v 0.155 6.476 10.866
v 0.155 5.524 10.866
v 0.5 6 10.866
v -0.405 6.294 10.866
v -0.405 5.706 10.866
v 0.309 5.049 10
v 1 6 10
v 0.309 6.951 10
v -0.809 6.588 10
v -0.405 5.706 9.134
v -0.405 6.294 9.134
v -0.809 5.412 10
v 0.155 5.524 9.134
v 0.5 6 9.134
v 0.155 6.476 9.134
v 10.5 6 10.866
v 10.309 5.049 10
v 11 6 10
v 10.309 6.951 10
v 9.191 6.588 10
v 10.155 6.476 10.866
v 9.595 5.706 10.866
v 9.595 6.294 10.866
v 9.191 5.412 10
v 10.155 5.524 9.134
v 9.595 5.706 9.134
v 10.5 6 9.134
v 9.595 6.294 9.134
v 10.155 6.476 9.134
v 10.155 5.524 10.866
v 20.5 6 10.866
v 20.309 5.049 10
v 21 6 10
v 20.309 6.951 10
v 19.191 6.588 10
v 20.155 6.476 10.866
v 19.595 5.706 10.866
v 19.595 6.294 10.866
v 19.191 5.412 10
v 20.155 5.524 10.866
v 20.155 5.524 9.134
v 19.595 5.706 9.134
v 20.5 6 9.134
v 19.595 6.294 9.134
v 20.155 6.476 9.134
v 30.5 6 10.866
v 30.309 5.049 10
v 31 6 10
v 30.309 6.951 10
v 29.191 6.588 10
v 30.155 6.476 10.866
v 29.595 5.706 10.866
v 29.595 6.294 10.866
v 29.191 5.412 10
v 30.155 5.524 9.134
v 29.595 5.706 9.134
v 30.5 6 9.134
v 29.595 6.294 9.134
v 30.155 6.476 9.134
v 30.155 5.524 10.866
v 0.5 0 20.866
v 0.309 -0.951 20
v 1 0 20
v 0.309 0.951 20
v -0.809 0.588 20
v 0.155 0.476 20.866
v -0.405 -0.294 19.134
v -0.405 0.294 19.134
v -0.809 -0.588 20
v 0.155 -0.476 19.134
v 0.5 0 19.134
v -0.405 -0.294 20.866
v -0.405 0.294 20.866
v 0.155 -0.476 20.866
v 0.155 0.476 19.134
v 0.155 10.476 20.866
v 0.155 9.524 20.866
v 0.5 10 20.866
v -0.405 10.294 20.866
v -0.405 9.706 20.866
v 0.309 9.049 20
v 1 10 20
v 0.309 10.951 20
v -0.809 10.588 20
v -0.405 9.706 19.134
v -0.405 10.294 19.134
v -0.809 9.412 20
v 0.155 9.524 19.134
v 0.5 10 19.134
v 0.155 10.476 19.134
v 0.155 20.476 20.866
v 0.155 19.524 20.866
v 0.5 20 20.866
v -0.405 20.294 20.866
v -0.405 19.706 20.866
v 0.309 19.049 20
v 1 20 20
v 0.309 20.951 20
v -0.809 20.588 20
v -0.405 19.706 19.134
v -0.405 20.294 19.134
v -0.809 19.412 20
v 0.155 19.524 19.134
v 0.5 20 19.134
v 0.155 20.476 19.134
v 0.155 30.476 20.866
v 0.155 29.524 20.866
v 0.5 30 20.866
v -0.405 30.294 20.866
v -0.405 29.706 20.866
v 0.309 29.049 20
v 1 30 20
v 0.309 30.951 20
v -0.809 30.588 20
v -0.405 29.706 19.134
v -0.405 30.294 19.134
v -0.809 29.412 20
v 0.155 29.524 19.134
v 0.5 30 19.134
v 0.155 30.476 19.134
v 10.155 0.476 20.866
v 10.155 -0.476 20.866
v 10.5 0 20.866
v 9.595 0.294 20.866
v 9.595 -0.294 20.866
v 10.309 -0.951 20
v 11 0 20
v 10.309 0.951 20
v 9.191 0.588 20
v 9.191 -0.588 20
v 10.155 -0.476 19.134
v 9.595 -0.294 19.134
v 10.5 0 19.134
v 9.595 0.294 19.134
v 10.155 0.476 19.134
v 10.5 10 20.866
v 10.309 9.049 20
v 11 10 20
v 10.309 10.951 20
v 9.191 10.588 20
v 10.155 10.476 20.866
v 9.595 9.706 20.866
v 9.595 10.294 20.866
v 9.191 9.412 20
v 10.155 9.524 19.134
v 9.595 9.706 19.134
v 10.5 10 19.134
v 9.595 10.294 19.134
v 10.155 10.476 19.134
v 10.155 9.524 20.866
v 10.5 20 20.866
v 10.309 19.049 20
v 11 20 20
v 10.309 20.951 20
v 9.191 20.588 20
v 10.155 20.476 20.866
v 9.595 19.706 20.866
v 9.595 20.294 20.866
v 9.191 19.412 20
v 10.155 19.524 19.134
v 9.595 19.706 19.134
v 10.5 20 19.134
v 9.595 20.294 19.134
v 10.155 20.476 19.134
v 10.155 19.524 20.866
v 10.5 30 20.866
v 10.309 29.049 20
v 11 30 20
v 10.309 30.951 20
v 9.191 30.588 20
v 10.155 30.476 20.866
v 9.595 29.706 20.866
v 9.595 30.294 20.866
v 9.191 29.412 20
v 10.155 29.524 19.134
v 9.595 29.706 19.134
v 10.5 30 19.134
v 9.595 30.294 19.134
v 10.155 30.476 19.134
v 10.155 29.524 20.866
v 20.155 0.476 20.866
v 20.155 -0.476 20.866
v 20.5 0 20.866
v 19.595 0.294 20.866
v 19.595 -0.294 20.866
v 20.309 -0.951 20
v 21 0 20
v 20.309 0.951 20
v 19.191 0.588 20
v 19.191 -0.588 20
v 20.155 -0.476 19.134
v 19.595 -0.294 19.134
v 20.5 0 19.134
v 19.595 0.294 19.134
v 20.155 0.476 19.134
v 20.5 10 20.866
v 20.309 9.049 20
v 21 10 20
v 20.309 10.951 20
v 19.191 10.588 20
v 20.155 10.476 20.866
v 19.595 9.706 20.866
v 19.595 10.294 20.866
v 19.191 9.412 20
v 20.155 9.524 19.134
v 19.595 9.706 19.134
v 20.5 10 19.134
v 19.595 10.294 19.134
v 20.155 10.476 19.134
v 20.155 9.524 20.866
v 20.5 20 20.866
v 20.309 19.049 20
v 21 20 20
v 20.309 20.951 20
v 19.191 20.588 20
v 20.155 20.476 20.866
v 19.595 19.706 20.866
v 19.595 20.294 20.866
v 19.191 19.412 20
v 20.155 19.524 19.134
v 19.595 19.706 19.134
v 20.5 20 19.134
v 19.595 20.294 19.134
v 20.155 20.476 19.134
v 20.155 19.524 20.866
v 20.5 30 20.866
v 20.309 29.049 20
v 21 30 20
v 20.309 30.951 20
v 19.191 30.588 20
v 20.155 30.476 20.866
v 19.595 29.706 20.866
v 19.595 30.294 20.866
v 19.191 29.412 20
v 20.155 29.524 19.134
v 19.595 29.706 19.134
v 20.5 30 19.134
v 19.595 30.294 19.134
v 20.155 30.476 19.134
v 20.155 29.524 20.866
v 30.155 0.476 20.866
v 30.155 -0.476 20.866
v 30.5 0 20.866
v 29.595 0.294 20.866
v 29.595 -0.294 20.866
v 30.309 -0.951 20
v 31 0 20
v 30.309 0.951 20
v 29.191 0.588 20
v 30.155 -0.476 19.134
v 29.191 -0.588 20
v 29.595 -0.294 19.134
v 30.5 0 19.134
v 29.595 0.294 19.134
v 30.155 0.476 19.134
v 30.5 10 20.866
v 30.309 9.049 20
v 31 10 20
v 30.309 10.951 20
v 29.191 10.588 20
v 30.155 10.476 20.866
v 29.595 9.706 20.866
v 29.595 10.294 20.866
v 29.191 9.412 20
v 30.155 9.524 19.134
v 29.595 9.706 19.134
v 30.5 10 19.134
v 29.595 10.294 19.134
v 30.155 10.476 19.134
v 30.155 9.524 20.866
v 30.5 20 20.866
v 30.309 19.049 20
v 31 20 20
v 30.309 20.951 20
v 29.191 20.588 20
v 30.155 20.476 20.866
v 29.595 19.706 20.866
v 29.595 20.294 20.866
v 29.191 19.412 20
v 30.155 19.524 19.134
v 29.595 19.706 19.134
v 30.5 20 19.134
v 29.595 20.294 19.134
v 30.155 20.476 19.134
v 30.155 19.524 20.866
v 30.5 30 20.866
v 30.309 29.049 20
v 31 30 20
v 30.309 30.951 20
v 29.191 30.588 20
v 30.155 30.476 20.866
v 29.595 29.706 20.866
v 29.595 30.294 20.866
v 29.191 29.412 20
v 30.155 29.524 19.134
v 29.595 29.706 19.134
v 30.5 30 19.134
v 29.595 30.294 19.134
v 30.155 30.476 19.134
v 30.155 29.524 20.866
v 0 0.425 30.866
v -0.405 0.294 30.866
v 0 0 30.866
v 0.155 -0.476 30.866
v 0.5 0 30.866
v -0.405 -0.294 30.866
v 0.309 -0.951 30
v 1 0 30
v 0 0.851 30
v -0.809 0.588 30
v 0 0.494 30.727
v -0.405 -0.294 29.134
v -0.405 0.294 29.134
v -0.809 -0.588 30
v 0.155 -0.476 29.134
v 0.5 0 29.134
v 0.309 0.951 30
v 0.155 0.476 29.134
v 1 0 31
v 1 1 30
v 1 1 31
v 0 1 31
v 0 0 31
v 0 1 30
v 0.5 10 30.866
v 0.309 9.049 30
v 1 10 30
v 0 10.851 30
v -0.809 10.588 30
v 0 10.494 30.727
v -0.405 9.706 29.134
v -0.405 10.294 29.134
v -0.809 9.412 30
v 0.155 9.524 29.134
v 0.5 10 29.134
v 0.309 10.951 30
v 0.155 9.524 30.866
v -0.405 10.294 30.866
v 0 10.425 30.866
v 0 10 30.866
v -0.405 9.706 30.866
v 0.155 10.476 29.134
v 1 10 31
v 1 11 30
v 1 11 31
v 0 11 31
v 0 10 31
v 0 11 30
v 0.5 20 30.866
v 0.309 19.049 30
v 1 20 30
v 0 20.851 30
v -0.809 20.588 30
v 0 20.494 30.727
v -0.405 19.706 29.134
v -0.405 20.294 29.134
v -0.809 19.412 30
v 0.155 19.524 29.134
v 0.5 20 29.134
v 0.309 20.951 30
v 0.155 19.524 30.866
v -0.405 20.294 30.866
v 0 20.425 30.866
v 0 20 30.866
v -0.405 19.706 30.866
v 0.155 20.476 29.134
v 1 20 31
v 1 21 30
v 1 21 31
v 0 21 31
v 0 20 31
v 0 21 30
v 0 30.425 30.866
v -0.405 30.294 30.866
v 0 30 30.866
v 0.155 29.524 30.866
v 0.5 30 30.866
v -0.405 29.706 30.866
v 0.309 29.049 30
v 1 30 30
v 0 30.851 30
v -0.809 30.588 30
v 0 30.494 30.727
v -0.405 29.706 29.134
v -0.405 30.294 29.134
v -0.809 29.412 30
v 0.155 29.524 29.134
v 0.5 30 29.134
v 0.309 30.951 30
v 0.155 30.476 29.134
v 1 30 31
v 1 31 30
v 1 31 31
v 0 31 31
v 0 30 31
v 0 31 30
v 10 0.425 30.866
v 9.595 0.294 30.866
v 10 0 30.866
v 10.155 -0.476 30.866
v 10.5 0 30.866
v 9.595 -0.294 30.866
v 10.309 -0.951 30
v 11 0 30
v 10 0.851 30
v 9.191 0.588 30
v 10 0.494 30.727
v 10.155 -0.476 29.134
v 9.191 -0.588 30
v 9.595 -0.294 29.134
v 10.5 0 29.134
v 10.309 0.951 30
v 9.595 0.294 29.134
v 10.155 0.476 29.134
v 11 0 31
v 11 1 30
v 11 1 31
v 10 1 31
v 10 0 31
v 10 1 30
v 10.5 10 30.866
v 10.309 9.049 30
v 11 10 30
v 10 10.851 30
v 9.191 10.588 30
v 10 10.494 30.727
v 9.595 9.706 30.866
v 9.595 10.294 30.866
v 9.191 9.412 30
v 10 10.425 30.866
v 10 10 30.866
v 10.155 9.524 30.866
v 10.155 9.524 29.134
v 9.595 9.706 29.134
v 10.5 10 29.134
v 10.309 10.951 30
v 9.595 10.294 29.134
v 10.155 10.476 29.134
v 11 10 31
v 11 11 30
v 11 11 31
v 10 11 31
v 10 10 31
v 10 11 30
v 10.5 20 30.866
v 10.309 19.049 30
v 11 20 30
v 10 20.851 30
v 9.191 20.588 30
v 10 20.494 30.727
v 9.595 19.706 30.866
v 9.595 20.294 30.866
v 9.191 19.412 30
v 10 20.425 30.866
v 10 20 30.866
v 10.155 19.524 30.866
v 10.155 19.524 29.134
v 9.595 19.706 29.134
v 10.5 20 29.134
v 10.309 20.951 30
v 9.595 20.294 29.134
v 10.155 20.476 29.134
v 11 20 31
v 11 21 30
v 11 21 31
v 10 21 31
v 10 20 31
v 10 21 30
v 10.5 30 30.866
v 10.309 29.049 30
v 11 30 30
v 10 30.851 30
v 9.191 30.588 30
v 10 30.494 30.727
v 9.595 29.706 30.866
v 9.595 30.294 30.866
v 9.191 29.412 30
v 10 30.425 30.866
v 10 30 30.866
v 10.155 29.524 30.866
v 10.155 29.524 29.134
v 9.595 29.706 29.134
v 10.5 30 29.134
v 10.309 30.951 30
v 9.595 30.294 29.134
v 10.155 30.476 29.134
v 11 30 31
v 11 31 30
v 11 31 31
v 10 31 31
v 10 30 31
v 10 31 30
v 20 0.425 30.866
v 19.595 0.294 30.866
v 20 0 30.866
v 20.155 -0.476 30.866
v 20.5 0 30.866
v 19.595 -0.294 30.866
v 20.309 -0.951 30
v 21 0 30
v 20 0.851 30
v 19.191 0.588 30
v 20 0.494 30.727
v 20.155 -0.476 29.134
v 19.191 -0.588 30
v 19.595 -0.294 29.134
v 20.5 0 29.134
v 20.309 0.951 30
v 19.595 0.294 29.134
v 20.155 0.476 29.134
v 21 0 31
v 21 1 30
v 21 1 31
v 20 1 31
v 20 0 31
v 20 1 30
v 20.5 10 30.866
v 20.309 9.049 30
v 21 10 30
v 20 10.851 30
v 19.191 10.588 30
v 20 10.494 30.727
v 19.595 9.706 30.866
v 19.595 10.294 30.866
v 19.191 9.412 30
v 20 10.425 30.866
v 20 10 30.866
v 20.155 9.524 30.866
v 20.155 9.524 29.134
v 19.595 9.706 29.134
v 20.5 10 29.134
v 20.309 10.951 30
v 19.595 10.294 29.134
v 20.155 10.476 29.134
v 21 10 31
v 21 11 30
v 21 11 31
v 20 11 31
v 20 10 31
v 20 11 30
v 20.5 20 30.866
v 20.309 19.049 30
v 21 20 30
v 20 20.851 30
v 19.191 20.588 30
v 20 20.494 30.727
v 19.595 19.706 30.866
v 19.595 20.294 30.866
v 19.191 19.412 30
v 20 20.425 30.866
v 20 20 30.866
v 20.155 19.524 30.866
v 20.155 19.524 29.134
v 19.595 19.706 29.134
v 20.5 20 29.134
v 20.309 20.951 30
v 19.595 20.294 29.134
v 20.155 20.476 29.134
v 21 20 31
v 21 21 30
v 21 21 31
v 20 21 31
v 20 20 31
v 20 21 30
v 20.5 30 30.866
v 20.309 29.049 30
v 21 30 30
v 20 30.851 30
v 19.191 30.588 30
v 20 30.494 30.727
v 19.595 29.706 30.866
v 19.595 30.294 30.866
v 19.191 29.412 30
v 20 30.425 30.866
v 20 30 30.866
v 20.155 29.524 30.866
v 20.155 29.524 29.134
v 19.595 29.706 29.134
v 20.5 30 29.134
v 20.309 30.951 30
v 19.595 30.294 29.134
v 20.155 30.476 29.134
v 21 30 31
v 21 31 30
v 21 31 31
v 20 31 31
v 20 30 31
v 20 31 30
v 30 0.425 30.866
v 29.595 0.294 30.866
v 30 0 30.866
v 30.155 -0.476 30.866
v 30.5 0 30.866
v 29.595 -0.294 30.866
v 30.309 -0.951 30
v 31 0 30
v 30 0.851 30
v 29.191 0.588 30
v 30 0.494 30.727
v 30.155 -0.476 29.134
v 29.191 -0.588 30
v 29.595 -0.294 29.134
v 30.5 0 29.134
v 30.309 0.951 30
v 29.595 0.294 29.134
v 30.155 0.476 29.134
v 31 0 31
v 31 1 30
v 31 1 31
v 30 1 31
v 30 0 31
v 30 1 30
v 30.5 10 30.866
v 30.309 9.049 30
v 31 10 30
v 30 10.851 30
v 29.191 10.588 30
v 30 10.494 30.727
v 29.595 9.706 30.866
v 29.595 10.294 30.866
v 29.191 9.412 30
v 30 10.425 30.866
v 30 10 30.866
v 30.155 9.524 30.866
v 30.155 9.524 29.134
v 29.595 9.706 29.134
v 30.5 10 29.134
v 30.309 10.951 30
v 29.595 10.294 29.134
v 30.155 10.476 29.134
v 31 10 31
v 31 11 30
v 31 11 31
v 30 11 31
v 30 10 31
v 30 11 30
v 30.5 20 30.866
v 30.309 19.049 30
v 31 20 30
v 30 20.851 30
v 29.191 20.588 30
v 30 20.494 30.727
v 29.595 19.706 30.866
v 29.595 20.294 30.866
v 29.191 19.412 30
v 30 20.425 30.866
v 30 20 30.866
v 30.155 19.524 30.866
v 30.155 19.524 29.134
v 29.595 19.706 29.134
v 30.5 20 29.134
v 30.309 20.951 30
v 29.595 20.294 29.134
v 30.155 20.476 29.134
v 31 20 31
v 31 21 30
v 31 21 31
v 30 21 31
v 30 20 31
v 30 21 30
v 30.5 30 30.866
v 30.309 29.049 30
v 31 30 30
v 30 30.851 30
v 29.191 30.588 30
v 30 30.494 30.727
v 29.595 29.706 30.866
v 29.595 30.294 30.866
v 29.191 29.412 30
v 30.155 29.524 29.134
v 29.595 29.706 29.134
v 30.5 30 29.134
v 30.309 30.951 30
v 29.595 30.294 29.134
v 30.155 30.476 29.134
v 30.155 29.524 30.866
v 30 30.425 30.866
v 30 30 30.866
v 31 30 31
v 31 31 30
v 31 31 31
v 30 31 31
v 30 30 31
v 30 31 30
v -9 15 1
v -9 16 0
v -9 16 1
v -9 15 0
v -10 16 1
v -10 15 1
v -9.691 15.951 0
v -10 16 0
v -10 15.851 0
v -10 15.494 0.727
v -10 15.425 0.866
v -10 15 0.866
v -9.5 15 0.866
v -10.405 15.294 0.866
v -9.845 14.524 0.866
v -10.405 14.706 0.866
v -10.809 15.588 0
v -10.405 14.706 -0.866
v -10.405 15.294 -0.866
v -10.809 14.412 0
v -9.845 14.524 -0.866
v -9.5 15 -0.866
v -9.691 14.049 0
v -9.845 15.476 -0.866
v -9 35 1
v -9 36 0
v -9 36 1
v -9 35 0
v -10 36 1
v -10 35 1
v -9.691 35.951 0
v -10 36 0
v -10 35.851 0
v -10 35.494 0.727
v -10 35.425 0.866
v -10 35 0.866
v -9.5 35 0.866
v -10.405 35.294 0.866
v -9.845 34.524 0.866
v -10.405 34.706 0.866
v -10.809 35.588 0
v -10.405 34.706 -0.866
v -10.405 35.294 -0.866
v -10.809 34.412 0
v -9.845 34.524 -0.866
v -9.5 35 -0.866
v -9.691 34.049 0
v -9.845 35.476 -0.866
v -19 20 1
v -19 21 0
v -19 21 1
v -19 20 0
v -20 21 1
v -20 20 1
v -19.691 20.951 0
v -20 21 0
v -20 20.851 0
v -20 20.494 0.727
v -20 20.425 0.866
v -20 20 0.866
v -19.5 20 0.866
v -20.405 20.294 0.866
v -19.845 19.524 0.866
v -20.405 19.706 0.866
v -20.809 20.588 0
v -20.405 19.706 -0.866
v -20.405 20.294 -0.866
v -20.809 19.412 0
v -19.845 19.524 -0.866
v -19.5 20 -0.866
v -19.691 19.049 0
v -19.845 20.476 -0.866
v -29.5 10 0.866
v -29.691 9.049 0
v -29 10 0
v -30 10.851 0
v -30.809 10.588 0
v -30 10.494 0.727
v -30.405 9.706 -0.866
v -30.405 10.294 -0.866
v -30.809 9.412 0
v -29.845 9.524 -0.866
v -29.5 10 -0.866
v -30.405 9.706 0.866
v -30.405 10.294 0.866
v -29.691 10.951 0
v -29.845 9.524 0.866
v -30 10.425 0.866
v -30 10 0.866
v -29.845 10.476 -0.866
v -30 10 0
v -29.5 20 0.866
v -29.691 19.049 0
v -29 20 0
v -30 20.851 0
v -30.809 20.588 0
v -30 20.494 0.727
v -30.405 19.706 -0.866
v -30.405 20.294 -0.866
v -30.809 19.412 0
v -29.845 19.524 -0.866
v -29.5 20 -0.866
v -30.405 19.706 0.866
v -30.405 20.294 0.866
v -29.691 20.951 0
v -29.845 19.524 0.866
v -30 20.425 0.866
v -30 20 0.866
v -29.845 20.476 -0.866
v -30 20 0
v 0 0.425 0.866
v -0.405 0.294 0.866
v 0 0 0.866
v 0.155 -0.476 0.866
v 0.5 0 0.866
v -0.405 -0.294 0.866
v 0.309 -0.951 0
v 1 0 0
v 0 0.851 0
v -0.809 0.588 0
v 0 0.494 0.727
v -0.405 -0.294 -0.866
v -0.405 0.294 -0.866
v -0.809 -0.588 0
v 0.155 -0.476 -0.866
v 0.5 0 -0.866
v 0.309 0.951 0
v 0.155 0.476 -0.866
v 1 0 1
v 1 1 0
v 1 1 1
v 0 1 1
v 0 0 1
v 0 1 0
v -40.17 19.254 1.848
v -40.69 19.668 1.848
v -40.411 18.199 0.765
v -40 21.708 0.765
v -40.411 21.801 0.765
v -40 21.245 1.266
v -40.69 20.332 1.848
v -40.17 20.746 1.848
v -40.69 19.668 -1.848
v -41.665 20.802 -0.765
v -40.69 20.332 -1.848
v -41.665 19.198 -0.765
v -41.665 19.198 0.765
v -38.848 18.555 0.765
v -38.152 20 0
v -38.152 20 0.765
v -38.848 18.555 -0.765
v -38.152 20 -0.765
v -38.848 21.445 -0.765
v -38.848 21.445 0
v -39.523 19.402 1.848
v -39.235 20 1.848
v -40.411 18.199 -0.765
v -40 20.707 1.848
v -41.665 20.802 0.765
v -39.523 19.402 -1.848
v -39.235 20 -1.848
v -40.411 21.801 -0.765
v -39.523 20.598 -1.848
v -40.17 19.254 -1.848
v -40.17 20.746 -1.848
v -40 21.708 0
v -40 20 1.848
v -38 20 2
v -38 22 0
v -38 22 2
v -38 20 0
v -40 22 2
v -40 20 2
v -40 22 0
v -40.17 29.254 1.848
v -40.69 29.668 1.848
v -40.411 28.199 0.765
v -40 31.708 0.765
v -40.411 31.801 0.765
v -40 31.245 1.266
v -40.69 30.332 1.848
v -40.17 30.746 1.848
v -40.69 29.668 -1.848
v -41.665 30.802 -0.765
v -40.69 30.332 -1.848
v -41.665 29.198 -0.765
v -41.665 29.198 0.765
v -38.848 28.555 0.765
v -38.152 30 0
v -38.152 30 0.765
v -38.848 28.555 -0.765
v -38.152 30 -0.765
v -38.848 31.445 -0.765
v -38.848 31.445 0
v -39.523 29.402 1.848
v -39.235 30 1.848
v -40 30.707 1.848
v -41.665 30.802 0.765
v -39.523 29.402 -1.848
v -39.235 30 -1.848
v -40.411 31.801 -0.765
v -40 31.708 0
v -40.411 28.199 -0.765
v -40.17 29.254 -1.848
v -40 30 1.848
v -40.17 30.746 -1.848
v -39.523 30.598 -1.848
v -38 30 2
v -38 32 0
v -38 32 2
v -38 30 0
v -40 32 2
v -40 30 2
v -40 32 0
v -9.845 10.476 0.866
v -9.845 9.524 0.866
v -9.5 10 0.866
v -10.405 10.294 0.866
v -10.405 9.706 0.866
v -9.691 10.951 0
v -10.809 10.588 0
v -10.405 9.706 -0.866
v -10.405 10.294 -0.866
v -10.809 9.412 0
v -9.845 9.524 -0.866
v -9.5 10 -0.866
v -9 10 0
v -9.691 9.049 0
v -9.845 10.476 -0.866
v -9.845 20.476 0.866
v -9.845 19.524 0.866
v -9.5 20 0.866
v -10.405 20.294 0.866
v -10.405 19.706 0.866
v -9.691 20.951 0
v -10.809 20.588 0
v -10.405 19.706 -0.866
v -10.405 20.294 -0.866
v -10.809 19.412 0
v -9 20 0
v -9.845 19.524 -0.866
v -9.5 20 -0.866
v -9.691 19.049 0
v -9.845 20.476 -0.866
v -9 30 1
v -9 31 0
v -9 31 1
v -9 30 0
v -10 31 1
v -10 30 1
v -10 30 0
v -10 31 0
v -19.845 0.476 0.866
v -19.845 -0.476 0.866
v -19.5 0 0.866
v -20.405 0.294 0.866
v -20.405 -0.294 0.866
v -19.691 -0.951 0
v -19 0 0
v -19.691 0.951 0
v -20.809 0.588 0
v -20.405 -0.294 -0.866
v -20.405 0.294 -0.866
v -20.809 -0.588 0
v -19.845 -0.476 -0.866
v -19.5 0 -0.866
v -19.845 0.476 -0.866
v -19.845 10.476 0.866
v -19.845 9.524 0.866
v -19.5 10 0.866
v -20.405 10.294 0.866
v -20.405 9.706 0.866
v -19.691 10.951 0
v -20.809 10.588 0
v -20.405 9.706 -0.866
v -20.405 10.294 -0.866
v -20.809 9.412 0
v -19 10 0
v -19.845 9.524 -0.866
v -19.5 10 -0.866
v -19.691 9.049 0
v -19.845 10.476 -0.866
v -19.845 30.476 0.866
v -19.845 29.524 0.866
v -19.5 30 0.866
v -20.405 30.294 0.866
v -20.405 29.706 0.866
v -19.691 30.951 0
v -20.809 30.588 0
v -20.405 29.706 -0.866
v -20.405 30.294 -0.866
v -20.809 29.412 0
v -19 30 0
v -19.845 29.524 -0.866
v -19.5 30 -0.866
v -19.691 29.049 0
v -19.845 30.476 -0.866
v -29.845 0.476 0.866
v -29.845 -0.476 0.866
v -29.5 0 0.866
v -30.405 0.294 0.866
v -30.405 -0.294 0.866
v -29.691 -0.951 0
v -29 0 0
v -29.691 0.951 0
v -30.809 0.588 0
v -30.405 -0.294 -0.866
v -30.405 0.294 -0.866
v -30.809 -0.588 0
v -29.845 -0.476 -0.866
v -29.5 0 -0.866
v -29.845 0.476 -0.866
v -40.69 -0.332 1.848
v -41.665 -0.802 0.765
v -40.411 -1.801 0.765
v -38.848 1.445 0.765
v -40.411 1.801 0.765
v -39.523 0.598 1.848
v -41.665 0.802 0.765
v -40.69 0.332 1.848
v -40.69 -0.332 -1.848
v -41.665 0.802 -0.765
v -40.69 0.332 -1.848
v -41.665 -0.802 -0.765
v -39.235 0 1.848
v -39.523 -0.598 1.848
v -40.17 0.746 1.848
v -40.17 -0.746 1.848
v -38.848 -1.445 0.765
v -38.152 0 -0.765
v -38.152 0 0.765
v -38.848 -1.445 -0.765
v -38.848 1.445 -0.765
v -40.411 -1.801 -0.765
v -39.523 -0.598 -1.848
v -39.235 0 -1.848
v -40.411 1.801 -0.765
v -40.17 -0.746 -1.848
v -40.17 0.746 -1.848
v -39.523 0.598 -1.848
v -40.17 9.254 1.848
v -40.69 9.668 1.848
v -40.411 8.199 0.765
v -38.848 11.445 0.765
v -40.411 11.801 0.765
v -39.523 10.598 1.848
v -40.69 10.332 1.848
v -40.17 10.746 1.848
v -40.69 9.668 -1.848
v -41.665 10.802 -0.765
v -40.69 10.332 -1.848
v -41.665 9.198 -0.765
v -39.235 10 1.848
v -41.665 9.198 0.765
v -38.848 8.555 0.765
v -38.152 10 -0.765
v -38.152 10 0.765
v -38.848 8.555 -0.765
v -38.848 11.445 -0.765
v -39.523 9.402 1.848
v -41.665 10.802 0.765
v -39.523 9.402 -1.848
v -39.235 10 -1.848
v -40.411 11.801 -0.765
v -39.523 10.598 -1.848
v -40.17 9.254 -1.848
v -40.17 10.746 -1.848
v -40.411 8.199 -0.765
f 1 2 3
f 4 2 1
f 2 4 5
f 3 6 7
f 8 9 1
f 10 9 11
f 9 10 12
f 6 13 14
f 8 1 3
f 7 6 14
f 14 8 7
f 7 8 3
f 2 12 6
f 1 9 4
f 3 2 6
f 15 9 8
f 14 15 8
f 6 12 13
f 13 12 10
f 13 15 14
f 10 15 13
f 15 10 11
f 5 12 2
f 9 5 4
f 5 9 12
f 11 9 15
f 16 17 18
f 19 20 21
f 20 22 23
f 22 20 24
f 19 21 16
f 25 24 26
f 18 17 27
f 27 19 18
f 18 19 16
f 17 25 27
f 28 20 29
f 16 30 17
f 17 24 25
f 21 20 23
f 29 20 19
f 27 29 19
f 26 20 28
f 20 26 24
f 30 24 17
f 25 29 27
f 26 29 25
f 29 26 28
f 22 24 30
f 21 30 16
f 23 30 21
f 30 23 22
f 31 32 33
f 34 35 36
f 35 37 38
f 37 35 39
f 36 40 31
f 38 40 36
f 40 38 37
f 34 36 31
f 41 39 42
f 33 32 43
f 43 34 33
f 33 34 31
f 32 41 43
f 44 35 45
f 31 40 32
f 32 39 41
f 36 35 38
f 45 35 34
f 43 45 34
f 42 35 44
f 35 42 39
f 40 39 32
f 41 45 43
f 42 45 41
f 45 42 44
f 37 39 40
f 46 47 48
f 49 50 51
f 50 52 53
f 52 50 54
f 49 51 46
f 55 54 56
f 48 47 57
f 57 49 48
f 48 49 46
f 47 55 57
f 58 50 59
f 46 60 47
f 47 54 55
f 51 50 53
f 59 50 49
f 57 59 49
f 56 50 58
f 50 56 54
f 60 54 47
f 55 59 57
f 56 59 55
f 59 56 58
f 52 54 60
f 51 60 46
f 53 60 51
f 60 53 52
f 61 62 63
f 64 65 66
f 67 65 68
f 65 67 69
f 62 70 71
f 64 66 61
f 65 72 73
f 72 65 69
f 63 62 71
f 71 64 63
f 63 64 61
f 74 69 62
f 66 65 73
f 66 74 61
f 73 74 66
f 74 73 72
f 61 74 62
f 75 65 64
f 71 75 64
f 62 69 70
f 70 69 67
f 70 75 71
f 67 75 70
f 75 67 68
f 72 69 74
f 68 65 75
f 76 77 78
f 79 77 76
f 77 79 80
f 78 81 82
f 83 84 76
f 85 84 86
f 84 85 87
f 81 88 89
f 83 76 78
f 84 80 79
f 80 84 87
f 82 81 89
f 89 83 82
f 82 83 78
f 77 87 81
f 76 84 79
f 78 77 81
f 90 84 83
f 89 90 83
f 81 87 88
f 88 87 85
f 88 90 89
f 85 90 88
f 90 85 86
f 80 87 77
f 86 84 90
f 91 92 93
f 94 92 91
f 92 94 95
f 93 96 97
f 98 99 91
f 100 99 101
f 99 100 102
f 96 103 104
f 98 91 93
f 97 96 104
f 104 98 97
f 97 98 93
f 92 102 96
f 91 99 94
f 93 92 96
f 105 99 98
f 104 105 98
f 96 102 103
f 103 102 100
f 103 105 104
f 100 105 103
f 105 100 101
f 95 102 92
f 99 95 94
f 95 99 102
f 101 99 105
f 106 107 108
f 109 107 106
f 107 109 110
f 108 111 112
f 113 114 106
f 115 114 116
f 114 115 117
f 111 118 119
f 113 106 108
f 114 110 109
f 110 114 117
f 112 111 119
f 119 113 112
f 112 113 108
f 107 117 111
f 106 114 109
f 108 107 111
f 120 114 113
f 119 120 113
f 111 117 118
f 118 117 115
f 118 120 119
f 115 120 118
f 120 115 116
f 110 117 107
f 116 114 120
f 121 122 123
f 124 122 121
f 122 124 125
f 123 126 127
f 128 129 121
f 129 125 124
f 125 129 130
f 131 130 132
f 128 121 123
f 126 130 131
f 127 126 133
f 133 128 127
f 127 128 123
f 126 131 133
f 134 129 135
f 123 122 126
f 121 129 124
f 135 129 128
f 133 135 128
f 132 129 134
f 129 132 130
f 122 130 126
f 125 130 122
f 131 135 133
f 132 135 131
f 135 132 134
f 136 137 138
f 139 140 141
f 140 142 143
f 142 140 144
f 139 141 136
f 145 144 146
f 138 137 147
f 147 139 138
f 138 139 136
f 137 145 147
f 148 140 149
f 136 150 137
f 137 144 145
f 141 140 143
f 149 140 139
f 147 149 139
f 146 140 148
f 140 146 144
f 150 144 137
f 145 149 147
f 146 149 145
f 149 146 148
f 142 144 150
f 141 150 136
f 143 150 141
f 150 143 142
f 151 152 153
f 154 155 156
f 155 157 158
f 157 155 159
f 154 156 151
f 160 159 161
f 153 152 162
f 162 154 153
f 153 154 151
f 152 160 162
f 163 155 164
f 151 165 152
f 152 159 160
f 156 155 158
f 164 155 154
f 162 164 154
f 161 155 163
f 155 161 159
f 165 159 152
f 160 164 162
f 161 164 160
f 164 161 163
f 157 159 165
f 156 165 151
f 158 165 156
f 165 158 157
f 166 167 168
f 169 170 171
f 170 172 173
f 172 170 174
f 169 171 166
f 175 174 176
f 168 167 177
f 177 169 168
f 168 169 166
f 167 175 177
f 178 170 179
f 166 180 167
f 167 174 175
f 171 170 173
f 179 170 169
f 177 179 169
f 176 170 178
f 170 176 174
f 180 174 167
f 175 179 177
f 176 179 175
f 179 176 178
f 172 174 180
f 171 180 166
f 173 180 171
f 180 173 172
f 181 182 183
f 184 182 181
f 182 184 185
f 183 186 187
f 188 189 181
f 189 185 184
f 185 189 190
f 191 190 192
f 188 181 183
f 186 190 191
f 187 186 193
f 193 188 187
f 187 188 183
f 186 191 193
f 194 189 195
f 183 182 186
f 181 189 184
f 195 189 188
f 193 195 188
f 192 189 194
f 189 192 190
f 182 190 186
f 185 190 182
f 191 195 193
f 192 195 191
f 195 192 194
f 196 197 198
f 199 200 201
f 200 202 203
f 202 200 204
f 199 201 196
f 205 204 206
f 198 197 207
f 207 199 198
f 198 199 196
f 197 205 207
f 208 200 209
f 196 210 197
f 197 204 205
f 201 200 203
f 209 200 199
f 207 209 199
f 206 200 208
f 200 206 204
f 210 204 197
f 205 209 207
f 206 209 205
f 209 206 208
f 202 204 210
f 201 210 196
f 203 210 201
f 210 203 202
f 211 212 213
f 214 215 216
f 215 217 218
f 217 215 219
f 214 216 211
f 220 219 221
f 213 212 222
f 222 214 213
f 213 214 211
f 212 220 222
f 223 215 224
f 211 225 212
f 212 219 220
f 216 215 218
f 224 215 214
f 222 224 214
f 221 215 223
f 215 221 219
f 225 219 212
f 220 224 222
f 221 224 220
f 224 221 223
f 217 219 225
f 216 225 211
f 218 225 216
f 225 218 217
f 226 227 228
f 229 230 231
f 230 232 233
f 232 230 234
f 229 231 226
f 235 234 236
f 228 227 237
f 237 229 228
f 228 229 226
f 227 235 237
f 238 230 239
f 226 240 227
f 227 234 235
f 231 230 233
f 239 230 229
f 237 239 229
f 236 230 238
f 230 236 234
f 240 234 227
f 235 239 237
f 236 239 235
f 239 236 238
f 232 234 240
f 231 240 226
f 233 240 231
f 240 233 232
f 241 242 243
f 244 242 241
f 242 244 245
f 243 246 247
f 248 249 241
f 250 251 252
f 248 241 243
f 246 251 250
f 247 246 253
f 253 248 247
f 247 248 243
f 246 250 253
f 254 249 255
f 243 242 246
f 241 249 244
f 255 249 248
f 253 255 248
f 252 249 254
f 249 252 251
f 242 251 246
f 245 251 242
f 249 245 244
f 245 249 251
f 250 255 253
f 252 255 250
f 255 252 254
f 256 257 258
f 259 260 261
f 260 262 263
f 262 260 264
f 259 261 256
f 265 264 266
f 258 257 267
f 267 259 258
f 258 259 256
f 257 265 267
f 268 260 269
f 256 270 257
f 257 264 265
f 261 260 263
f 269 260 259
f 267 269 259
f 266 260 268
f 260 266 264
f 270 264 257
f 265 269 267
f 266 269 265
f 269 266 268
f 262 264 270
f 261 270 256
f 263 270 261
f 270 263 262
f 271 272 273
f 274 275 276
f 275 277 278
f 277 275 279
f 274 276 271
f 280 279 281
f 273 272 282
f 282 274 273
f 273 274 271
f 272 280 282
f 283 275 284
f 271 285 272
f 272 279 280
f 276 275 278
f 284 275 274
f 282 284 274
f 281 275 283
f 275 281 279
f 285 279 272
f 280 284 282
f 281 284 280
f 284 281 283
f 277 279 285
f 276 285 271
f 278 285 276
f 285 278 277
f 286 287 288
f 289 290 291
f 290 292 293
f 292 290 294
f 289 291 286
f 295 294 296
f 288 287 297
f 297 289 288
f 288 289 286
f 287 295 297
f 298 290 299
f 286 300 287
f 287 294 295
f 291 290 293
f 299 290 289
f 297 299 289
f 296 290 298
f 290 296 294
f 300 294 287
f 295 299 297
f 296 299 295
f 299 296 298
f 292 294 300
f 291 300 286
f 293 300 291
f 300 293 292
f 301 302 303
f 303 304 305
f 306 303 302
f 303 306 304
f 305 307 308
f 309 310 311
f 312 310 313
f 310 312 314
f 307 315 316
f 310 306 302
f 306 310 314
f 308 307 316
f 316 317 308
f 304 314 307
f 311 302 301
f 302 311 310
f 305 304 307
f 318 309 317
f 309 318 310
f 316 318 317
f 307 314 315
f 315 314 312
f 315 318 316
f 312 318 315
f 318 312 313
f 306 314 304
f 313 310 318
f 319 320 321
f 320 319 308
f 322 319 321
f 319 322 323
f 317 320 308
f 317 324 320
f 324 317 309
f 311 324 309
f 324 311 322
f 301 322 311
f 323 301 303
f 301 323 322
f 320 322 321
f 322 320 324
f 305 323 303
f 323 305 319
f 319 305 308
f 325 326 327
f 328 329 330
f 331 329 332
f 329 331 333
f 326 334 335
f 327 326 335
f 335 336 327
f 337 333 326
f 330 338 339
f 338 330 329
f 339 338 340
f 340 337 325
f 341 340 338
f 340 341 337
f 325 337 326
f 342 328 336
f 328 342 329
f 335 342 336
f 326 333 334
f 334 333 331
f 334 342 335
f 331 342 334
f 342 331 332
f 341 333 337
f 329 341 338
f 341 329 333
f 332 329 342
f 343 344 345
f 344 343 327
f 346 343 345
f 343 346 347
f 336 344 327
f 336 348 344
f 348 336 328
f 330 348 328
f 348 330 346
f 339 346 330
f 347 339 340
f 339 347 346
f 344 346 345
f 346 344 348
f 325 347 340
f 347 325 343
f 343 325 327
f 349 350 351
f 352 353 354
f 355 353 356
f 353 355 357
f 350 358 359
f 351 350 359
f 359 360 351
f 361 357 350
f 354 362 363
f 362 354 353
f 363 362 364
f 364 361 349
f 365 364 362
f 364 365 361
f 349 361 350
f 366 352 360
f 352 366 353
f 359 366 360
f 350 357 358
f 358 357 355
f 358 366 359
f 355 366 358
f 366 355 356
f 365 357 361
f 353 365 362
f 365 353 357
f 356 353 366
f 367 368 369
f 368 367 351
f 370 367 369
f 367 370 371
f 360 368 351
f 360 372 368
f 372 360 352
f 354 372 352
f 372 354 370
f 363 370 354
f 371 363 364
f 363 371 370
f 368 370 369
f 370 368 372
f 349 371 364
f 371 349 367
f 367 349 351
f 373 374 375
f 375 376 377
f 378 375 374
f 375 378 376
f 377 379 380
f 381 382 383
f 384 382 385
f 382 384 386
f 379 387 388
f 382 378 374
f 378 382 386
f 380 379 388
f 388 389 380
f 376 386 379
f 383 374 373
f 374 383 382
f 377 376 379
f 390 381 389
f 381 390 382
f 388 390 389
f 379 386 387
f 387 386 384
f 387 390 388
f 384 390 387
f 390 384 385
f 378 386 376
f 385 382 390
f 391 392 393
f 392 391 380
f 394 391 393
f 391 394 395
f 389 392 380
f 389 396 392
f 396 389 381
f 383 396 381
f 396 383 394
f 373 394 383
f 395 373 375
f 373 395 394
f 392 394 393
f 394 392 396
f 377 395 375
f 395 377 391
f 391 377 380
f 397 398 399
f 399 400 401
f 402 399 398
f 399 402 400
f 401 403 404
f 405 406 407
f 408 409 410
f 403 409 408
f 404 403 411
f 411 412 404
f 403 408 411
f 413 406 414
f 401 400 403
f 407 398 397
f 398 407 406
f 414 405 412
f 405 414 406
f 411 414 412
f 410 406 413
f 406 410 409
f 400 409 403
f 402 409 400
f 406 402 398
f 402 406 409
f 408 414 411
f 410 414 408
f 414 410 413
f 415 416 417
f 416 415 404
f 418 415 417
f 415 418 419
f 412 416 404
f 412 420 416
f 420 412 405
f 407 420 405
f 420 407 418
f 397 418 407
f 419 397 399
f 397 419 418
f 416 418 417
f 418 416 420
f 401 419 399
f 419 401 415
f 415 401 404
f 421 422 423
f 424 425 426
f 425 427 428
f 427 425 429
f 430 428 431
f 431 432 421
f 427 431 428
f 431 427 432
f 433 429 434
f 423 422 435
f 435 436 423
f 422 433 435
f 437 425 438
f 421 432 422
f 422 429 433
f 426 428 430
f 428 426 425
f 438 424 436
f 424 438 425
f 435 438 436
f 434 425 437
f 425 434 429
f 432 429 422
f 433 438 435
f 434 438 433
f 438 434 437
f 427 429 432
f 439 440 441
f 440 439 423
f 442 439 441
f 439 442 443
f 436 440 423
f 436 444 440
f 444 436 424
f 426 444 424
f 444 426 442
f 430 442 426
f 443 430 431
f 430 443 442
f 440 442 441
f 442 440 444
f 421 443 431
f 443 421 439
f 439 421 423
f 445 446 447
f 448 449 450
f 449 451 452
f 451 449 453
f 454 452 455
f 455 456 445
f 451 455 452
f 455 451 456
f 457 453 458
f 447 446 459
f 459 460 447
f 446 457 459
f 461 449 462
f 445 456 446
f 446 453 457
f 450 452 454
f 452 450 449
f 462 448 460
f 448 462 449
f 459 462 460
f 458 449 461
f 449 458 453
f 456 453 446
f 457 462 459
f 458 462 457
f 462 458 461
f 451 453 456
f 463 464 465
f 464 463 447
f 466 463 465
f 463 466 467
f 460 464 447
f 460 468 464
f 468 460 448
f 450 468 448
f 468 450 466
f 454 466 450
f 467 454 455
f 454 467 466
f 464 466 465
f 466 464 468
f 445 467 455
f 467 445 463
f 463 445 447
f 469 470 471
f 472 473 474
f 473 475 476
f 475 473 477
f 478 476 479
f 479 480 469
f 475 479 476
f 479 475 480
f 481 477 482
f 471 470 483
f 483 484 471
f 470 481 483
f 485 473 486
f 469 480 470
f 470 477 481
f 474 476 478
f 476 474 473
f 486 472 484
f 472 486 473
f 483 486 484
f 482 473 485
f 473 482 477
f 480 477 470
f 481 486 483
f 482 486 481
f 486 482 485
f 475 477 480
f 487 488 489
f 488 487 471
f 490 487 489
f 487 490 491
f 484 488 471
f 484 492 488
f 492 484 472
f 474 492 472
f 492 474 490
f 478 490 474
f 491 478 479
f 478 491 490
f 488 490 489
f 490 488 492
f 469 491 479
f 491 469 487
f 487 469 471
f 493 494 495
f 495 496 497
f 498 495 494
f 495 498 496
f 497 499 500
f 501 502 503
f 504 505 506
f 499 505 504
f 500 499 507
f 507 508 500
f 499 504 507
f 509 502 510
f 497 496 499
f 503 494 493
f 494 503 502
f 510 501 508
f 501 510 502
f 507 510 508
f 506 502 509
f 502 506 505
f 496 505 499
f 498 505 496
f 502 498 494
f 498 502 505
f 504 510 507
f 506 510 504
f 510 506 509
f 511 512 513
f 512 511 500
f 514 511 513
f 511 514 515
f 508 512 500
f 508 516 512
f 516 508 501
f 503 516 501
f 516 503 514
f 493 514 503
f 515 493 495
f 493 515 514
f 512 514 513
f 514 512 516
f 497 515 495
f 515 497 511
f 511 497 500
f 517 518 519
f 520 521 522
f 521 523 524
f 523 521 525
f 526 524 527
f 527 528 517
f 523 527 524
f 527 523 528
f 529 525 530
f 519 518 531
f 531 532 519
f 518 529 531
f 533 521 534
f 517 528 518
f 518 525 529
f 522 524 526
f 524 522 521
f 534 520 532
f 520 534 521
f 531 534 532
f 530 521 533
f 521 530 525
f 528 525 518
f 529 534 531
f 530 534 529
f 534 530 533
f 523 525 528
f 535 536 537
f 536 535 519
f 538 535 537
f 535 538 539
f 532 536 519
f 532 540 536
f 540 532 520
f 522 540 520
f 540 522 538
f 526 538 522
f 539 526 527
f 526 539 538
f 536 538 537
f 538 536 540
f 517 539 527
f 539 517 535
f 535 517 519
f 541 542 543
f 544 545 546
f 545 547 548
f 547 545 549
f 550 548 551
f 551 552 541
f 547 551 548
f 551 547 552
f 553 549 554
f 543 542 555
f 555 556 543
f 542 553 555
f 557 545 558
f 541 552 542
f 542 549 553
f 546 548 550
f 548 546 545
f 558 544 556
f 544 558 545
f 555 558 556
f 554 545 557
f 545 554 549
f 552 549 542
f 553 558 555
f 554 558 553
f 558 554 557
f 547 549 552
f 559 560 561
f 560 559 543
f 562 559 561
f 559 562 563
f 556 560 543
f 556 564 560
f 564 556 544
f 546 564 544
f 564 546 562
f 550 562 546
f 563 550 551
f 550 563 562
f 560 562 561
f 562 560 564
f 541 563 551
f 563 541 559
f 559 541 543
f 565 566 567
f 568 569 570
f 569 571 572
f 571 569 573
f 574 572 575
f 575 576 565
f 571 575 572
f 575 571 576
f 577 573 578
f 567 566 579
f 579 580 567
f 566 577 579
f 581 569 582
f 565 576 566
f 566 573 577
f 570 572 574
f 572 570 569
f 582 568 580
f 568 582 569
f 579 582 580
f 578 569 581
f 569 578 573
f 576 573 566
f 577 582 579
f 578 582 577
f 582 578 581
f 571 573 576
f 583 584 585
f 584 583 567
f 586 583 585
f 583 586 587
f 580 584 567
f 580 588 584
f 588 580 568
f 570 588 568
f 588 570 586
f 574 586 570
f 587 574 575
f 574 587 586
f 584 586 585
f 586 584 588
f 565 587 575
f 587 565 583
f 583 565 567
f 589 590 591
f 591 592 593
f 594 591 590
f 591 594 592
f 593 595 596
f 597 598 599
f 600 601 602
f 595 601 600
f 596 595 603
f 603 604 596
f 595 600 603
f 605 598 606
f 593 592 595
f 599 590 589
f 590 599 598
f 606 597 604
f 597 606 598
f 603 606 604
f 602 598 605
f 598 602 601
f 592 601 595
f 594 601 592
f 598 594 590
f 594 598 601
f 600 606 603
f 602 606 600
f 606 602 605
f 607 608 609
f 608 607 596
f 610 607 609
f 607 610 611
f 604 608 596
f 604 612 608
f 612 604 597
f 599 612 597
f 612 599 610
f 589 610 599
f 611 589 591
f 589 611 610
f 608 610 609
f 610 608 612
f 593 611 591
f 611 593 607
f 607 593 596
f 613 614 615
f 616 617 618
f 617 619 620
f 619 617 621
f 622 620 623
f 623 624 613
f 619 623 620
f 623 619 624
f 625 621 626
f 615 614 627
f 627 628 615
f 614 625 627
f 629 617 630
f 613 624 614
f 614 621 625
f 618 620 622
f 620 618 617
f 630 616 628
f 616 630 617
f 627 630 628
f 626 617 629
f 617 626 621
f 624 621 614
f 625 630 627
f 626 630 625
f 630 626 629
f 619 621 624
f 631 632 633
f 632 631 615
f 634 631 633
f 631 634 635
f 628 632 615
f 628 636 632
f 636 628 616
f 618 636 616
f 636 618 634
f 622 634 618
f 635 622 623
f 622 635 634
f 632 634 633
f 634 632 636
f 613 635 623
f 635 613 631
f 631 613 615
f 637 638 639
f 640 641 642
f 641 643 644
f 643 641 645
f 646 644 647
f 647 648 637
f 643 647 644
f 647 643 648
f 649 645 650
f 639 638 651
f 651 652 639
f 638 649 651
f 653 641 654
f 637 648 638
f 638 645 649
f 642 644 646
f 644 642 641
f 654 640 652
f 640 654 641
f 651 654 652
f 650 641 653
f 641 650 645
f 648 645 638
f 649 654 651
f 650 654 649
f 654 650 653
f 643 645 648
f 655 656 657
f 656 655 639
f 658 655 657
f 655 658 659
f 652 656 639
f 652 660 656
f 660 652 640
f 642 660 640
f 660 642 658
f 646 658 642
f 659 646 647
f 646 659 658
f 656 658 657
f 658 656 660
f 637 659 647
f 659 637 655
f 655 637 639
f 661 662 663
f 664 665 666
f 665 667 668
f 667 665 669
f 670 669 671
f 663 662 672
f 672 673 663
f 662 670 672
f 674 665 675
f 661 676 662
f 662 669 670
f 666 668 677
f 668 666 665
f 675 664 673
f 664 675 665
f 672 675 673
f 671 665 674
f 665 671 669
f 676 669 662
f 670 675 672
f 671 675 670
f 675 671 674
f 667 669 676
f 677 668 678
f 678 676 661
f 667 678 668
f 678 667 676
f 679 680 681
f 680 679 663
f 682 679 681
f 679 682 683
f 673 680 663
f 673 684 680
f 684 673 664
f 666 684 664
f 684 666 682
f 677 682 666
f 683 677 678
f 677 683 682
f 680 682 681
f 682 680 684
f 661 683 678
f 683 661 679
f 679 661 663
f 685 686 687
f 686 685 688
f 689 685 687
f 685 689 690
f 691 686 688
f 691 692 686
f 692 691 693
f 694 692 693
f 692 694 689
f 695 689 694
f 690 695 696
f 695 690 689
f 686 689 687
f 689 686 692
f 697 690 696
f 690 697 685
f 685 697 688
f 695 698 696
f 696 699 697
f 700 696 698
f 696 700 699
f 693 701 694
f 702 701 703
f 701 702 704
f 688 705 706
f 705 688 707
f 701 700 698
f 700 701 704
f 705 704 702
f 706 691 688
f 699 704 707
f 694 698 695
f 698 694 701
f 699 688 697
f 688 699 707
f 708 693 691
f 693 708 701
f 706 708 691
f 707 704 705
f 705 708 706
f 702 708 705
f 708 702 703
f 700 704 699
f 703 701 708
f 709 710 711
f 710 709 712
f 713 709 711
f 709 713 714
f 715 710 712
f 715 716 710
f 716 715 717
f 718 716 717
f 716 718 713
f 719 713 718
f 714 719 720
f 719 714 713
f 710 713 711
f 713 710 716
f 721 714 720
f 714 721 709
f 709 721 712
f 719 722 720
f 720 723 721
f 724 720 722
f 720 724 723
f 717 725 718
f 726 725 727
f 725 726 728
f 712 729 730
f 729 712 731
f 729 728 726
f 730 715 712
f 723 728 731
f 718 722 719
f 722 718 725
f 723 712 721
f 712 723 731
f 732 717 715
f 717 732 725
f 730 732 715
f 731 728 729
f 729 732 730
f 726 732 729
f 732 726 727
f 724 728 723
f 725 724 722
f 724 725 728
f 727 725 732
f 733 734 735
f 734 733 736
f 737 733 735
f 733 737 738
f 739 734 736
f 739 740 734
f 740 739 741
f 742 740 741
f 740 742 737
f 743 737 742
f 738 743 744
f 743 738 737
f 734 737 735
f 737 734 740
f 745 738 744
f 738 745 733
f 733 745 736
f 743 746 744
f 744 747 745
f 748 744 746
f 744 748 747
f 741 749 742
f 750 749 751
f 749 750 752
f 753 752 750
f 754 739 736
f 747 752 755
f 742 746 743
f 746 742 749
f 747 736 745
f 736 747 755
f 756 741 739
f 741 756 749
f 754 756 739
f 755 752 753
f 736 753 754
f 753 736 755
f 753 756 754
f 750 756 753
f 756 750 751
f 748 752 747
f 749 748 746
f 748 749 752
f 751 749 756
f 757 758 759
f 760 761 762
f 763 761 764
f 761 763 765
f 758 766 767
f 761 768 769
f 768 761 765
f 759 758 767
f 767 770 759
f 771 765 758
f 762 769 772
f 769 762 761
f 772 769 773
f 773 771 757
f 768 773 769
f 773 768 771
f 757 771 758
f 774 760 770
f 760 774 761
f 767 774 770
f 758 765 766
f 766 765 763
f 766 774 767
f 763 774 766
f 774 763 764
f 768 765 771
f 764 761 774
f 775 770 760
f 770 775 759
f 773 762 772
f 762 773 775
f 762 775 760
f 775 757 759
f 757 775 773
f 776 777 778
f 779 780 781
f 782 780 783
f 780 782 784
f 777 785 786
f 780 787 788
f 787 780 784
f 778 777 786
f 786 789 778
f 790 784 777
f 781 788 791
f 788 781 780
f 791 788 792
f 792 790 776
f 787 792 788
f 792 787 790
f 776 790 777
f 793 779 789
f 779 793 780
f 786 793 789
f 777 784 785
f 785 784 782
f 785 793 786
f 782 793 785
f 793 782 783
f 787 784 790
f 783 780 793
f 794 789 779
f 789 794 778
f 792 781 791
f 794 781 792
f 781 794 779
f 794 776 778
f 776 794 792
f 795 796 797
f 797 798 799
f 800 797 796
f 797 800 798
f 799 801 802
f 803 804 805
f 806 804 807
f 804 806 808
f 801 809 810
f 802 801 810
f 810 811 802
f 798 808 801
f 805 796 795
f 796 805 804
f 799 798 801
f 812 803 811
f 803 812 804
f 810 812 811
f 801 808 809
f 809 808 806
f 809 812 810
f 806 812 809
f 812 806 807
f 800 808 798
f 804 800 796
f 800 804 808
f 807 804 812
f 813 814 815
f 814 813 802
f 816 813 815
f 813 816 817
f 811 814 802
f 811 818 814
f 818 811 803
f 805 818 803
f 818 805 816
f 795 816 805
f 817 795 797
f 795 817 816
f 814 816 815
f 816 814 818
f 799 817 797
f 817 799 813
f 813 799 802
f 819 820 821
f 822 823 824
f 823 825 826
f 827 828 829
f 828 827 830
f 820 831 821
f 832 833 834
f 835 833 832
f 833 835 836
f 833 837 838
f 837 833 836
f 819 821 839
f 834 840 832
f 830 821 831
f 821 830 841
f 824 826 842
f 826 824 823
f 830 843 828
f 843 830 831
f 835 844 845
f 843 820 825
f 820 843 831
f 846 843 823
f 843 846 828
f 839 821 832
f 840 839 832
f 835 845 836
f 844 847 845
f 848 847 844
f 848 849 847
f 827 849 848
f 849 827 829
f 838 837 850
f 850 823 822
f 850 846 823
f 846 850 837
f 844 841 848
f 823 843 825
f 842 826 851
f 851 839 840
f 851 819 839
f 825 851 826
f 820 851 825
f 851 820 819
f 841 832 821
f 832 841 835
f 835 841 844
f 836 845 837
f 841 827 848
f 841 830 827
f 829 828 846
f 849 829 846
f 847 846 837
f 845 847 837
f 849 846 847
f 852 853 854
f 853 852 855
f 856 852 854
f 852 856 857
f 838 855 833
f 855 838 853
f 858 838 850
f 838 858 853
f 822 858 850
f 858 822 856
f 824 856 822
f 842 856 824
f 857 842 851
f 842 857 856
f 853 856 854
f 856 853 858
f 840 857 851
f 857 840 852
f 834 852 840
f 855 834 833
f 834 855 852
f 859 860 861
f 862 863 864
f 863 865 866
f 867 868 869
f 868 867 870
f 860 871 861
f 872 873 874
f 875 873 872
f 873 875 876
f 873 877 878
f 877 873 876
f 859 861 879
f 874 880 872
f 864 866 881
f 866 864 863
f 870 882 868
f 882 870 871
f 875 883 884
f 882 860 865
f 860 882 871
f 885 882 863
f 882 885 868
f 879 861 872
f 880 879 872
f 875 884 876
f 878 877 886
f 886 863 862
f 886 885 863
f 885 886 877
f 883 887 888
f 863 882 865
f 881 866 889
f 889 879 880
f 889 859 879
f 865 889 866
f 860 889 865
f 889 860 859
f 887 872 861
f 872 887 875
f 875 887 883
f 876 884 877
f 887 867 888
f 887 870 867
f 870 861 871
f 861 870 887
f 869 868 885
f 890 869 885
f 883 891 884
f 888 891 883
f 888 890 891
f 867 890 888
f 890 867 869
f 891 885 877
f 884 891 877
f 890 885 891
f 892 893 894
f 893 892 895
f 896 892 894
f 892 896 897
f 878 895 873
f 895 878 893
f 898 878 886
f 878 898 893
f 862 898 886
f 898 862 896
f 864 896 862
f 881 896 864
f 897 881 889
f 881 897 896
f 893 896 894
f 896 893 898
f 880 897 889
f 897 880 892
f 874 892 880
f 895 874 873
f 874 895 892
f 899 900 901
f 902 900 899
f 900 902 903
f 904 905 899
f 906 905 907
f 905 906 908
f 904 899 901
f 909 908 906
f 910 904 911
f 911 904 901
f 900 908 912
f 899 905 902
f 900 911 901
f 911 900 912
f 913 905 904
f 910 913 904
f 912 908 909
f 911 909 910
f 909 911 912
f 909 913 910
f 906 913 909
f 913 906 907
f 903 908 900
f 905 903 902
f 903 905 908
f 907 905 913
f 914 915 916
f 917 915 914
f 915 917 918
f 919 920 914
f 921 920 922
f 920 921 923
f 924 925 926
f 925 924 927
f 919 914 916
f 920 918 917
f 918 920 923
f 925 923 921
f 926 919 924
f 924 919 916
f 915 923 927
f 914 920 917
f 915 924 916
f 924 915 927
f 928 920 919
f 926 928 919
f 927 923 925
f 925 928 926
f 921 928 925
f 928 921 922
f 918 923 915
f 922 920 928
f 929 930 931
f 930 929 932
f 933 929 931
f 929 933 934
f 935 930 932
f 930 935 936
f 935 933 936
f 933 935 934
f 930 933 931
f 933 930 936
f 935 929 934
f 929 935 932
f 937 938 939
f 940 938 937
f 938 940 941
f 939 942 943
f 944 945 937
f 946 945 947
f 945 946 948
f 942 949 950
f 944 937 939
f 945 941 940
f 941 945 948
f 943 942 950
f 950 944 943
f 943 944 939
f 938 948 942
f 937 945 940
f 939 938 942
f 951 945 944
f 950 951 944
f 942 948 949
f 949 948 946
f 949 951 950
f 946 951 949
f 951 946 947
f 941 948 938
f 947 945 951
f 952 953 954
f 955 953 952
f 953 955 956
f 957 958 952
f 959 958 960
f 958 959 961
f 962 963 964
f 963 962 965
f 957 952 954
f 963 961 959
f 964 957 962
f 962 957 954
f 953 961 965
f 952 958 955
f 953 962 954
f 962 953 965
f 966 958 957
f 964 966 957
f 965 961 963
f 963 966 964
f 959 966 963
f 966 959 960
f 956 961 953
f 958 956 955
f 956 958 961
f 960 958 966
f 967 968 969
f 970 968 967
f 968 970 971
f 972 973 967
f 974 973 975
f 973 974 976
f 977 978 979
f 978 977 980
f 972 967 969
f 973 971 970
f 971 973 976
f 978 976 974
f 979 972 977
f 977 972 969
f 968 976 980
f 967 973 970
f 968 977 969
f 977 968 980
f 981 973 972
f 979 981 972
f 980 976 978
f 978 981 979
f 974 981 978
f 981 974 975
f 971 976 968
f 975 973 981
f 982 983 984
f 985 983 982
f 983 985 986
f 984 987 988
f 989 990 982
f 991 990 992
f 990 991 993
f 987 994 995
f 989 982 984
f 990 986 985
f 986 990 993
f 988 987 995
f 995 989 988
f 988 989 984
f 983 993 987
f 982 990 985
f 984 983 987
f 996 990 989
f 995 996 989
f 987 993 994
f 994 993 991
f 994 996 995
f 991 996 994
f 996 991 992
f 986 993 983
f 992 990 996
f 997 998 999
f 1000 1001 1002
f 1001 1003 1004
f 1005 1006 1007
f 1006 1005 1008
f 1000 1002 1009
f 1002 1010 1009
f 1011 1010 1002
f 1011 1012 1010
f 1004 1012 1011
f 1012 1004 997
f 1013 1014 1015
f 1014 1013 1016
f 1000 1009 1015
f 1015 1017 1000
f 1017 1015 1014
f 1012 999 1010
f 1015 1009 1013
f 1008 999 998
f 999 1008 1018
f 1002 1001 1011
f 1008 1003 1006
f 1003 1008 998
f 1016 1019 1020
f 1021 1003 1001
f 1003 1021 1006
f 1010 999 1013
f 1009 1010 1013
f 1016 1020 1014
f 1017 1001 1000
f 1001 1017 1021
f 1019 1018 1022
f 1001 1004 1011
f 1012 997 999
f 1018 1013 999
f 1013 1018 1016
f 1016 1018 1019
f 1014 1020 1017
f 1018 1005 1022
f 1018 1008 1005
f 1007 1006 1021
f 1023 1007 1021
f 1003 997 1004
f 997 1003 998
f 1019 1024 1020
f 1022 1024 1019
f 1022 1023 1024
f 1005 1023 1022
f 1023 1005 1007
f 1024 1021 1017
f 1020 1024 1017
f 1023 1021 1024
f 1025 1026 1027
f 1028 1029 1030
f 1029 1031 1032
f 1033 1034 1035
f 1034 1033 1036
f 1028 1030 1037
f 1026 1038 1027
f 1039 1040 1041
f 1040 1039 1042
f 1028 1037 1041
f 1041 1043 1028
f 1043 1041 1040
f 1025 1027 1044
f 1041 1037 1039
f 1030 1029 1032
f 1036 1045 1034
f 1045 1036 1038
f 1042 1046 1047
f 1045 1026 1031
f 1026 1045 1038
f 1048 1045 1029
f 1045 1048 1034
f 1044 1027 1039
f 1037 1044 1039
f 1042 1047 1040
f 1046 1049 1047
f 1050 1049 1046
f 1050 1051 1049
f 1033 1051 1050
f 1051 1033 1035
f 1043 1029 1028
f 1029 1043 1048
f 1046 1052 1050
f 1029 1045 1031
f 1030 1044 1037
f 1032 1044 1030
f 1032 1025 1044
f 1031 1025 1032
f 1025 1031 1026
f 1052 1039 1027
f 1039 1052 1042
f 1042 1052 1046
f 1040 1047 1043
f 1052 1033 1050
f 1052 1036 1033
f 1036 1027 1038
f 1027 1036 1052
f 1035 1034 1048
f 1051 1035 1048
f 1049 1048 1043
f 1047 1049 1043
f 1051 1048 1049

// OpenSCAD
a=[for(i=[1:2:6])  i]; echo (a);
b=[for(i=[1:2:6]) if(i!=2)  i]; echo (b);
c=[for(i=[1:2:6]) if(i!=2) let(x=2*i) [i,x]]; echo (c);

module foo() ;
module foo0() {};
module foo1()  translate([-20,0,0]) sphere();
module foo2() { translate([-20,10,0])sphere();}
module foo3() { translate([-20,20,0])cube(); translate([-20,20,0])sphere();}
module foo4() { a=1; translate([-20,30,0])sphere();}
module foo5() {a=1;};

for(i=[0:10:30]) ;
for(i=[0:10:30]) { }
for(i=[0:10:30]) { translate ([i,6,10]) sphere();}
for(i=[0:10:30],j=[0:10:30]) { translate ([i,j,20])sphere();}
for(i=[0:10:30],j=[0:10:30]) { a=j; translate ([i,a,30])sphere(); translate ([i,a,30]) cube();}

if(true) {} else {}
if(true) {translate([-10,10,0]) sphere();}
if(true) {translate([-10,15,0])cube(); translate([-10,15,0])sphere();}
if(true) { a=1; translate([-10,20,0])sphere();}
if(false) translate([-10,30,0])sphere(); else translate([-10,30,0]) cube();
if(false) translate([-10,35,0])sphere(); else {translate([-10,35,0])cube();translate([-10,35,0])sphere();}

foo();
foo0();
foo1();
foo2();
foo3();
foo4();

translate([-30,0,0]) ;
translate([-30,0,0]) {};
translate([-30,0,0]) difference() sphere();
translate([-30,10,0]) difference(){sphere();cube();}
translate([-30,20,0]) difference(){a=1; sphere();cube();}

union() ;
union() {}
union()sphere();cube();
union(){sphere();cube();}
union(){a=1;sphere();cube();}

assign(a=2) {}
assign(a=2) translate([-40,0,0]) sphere(a);
assign(a=2) {translate([-40,10,0]) sphere(a);};
assign(a=2) {translate([-40,20,0]) sphere(a);translate([-40,20,0]) cube(a);};
assign(a=2) {b=2;translate([-40,30,0]) sphere(a);translate([-40,30,0]) cube(a);};
